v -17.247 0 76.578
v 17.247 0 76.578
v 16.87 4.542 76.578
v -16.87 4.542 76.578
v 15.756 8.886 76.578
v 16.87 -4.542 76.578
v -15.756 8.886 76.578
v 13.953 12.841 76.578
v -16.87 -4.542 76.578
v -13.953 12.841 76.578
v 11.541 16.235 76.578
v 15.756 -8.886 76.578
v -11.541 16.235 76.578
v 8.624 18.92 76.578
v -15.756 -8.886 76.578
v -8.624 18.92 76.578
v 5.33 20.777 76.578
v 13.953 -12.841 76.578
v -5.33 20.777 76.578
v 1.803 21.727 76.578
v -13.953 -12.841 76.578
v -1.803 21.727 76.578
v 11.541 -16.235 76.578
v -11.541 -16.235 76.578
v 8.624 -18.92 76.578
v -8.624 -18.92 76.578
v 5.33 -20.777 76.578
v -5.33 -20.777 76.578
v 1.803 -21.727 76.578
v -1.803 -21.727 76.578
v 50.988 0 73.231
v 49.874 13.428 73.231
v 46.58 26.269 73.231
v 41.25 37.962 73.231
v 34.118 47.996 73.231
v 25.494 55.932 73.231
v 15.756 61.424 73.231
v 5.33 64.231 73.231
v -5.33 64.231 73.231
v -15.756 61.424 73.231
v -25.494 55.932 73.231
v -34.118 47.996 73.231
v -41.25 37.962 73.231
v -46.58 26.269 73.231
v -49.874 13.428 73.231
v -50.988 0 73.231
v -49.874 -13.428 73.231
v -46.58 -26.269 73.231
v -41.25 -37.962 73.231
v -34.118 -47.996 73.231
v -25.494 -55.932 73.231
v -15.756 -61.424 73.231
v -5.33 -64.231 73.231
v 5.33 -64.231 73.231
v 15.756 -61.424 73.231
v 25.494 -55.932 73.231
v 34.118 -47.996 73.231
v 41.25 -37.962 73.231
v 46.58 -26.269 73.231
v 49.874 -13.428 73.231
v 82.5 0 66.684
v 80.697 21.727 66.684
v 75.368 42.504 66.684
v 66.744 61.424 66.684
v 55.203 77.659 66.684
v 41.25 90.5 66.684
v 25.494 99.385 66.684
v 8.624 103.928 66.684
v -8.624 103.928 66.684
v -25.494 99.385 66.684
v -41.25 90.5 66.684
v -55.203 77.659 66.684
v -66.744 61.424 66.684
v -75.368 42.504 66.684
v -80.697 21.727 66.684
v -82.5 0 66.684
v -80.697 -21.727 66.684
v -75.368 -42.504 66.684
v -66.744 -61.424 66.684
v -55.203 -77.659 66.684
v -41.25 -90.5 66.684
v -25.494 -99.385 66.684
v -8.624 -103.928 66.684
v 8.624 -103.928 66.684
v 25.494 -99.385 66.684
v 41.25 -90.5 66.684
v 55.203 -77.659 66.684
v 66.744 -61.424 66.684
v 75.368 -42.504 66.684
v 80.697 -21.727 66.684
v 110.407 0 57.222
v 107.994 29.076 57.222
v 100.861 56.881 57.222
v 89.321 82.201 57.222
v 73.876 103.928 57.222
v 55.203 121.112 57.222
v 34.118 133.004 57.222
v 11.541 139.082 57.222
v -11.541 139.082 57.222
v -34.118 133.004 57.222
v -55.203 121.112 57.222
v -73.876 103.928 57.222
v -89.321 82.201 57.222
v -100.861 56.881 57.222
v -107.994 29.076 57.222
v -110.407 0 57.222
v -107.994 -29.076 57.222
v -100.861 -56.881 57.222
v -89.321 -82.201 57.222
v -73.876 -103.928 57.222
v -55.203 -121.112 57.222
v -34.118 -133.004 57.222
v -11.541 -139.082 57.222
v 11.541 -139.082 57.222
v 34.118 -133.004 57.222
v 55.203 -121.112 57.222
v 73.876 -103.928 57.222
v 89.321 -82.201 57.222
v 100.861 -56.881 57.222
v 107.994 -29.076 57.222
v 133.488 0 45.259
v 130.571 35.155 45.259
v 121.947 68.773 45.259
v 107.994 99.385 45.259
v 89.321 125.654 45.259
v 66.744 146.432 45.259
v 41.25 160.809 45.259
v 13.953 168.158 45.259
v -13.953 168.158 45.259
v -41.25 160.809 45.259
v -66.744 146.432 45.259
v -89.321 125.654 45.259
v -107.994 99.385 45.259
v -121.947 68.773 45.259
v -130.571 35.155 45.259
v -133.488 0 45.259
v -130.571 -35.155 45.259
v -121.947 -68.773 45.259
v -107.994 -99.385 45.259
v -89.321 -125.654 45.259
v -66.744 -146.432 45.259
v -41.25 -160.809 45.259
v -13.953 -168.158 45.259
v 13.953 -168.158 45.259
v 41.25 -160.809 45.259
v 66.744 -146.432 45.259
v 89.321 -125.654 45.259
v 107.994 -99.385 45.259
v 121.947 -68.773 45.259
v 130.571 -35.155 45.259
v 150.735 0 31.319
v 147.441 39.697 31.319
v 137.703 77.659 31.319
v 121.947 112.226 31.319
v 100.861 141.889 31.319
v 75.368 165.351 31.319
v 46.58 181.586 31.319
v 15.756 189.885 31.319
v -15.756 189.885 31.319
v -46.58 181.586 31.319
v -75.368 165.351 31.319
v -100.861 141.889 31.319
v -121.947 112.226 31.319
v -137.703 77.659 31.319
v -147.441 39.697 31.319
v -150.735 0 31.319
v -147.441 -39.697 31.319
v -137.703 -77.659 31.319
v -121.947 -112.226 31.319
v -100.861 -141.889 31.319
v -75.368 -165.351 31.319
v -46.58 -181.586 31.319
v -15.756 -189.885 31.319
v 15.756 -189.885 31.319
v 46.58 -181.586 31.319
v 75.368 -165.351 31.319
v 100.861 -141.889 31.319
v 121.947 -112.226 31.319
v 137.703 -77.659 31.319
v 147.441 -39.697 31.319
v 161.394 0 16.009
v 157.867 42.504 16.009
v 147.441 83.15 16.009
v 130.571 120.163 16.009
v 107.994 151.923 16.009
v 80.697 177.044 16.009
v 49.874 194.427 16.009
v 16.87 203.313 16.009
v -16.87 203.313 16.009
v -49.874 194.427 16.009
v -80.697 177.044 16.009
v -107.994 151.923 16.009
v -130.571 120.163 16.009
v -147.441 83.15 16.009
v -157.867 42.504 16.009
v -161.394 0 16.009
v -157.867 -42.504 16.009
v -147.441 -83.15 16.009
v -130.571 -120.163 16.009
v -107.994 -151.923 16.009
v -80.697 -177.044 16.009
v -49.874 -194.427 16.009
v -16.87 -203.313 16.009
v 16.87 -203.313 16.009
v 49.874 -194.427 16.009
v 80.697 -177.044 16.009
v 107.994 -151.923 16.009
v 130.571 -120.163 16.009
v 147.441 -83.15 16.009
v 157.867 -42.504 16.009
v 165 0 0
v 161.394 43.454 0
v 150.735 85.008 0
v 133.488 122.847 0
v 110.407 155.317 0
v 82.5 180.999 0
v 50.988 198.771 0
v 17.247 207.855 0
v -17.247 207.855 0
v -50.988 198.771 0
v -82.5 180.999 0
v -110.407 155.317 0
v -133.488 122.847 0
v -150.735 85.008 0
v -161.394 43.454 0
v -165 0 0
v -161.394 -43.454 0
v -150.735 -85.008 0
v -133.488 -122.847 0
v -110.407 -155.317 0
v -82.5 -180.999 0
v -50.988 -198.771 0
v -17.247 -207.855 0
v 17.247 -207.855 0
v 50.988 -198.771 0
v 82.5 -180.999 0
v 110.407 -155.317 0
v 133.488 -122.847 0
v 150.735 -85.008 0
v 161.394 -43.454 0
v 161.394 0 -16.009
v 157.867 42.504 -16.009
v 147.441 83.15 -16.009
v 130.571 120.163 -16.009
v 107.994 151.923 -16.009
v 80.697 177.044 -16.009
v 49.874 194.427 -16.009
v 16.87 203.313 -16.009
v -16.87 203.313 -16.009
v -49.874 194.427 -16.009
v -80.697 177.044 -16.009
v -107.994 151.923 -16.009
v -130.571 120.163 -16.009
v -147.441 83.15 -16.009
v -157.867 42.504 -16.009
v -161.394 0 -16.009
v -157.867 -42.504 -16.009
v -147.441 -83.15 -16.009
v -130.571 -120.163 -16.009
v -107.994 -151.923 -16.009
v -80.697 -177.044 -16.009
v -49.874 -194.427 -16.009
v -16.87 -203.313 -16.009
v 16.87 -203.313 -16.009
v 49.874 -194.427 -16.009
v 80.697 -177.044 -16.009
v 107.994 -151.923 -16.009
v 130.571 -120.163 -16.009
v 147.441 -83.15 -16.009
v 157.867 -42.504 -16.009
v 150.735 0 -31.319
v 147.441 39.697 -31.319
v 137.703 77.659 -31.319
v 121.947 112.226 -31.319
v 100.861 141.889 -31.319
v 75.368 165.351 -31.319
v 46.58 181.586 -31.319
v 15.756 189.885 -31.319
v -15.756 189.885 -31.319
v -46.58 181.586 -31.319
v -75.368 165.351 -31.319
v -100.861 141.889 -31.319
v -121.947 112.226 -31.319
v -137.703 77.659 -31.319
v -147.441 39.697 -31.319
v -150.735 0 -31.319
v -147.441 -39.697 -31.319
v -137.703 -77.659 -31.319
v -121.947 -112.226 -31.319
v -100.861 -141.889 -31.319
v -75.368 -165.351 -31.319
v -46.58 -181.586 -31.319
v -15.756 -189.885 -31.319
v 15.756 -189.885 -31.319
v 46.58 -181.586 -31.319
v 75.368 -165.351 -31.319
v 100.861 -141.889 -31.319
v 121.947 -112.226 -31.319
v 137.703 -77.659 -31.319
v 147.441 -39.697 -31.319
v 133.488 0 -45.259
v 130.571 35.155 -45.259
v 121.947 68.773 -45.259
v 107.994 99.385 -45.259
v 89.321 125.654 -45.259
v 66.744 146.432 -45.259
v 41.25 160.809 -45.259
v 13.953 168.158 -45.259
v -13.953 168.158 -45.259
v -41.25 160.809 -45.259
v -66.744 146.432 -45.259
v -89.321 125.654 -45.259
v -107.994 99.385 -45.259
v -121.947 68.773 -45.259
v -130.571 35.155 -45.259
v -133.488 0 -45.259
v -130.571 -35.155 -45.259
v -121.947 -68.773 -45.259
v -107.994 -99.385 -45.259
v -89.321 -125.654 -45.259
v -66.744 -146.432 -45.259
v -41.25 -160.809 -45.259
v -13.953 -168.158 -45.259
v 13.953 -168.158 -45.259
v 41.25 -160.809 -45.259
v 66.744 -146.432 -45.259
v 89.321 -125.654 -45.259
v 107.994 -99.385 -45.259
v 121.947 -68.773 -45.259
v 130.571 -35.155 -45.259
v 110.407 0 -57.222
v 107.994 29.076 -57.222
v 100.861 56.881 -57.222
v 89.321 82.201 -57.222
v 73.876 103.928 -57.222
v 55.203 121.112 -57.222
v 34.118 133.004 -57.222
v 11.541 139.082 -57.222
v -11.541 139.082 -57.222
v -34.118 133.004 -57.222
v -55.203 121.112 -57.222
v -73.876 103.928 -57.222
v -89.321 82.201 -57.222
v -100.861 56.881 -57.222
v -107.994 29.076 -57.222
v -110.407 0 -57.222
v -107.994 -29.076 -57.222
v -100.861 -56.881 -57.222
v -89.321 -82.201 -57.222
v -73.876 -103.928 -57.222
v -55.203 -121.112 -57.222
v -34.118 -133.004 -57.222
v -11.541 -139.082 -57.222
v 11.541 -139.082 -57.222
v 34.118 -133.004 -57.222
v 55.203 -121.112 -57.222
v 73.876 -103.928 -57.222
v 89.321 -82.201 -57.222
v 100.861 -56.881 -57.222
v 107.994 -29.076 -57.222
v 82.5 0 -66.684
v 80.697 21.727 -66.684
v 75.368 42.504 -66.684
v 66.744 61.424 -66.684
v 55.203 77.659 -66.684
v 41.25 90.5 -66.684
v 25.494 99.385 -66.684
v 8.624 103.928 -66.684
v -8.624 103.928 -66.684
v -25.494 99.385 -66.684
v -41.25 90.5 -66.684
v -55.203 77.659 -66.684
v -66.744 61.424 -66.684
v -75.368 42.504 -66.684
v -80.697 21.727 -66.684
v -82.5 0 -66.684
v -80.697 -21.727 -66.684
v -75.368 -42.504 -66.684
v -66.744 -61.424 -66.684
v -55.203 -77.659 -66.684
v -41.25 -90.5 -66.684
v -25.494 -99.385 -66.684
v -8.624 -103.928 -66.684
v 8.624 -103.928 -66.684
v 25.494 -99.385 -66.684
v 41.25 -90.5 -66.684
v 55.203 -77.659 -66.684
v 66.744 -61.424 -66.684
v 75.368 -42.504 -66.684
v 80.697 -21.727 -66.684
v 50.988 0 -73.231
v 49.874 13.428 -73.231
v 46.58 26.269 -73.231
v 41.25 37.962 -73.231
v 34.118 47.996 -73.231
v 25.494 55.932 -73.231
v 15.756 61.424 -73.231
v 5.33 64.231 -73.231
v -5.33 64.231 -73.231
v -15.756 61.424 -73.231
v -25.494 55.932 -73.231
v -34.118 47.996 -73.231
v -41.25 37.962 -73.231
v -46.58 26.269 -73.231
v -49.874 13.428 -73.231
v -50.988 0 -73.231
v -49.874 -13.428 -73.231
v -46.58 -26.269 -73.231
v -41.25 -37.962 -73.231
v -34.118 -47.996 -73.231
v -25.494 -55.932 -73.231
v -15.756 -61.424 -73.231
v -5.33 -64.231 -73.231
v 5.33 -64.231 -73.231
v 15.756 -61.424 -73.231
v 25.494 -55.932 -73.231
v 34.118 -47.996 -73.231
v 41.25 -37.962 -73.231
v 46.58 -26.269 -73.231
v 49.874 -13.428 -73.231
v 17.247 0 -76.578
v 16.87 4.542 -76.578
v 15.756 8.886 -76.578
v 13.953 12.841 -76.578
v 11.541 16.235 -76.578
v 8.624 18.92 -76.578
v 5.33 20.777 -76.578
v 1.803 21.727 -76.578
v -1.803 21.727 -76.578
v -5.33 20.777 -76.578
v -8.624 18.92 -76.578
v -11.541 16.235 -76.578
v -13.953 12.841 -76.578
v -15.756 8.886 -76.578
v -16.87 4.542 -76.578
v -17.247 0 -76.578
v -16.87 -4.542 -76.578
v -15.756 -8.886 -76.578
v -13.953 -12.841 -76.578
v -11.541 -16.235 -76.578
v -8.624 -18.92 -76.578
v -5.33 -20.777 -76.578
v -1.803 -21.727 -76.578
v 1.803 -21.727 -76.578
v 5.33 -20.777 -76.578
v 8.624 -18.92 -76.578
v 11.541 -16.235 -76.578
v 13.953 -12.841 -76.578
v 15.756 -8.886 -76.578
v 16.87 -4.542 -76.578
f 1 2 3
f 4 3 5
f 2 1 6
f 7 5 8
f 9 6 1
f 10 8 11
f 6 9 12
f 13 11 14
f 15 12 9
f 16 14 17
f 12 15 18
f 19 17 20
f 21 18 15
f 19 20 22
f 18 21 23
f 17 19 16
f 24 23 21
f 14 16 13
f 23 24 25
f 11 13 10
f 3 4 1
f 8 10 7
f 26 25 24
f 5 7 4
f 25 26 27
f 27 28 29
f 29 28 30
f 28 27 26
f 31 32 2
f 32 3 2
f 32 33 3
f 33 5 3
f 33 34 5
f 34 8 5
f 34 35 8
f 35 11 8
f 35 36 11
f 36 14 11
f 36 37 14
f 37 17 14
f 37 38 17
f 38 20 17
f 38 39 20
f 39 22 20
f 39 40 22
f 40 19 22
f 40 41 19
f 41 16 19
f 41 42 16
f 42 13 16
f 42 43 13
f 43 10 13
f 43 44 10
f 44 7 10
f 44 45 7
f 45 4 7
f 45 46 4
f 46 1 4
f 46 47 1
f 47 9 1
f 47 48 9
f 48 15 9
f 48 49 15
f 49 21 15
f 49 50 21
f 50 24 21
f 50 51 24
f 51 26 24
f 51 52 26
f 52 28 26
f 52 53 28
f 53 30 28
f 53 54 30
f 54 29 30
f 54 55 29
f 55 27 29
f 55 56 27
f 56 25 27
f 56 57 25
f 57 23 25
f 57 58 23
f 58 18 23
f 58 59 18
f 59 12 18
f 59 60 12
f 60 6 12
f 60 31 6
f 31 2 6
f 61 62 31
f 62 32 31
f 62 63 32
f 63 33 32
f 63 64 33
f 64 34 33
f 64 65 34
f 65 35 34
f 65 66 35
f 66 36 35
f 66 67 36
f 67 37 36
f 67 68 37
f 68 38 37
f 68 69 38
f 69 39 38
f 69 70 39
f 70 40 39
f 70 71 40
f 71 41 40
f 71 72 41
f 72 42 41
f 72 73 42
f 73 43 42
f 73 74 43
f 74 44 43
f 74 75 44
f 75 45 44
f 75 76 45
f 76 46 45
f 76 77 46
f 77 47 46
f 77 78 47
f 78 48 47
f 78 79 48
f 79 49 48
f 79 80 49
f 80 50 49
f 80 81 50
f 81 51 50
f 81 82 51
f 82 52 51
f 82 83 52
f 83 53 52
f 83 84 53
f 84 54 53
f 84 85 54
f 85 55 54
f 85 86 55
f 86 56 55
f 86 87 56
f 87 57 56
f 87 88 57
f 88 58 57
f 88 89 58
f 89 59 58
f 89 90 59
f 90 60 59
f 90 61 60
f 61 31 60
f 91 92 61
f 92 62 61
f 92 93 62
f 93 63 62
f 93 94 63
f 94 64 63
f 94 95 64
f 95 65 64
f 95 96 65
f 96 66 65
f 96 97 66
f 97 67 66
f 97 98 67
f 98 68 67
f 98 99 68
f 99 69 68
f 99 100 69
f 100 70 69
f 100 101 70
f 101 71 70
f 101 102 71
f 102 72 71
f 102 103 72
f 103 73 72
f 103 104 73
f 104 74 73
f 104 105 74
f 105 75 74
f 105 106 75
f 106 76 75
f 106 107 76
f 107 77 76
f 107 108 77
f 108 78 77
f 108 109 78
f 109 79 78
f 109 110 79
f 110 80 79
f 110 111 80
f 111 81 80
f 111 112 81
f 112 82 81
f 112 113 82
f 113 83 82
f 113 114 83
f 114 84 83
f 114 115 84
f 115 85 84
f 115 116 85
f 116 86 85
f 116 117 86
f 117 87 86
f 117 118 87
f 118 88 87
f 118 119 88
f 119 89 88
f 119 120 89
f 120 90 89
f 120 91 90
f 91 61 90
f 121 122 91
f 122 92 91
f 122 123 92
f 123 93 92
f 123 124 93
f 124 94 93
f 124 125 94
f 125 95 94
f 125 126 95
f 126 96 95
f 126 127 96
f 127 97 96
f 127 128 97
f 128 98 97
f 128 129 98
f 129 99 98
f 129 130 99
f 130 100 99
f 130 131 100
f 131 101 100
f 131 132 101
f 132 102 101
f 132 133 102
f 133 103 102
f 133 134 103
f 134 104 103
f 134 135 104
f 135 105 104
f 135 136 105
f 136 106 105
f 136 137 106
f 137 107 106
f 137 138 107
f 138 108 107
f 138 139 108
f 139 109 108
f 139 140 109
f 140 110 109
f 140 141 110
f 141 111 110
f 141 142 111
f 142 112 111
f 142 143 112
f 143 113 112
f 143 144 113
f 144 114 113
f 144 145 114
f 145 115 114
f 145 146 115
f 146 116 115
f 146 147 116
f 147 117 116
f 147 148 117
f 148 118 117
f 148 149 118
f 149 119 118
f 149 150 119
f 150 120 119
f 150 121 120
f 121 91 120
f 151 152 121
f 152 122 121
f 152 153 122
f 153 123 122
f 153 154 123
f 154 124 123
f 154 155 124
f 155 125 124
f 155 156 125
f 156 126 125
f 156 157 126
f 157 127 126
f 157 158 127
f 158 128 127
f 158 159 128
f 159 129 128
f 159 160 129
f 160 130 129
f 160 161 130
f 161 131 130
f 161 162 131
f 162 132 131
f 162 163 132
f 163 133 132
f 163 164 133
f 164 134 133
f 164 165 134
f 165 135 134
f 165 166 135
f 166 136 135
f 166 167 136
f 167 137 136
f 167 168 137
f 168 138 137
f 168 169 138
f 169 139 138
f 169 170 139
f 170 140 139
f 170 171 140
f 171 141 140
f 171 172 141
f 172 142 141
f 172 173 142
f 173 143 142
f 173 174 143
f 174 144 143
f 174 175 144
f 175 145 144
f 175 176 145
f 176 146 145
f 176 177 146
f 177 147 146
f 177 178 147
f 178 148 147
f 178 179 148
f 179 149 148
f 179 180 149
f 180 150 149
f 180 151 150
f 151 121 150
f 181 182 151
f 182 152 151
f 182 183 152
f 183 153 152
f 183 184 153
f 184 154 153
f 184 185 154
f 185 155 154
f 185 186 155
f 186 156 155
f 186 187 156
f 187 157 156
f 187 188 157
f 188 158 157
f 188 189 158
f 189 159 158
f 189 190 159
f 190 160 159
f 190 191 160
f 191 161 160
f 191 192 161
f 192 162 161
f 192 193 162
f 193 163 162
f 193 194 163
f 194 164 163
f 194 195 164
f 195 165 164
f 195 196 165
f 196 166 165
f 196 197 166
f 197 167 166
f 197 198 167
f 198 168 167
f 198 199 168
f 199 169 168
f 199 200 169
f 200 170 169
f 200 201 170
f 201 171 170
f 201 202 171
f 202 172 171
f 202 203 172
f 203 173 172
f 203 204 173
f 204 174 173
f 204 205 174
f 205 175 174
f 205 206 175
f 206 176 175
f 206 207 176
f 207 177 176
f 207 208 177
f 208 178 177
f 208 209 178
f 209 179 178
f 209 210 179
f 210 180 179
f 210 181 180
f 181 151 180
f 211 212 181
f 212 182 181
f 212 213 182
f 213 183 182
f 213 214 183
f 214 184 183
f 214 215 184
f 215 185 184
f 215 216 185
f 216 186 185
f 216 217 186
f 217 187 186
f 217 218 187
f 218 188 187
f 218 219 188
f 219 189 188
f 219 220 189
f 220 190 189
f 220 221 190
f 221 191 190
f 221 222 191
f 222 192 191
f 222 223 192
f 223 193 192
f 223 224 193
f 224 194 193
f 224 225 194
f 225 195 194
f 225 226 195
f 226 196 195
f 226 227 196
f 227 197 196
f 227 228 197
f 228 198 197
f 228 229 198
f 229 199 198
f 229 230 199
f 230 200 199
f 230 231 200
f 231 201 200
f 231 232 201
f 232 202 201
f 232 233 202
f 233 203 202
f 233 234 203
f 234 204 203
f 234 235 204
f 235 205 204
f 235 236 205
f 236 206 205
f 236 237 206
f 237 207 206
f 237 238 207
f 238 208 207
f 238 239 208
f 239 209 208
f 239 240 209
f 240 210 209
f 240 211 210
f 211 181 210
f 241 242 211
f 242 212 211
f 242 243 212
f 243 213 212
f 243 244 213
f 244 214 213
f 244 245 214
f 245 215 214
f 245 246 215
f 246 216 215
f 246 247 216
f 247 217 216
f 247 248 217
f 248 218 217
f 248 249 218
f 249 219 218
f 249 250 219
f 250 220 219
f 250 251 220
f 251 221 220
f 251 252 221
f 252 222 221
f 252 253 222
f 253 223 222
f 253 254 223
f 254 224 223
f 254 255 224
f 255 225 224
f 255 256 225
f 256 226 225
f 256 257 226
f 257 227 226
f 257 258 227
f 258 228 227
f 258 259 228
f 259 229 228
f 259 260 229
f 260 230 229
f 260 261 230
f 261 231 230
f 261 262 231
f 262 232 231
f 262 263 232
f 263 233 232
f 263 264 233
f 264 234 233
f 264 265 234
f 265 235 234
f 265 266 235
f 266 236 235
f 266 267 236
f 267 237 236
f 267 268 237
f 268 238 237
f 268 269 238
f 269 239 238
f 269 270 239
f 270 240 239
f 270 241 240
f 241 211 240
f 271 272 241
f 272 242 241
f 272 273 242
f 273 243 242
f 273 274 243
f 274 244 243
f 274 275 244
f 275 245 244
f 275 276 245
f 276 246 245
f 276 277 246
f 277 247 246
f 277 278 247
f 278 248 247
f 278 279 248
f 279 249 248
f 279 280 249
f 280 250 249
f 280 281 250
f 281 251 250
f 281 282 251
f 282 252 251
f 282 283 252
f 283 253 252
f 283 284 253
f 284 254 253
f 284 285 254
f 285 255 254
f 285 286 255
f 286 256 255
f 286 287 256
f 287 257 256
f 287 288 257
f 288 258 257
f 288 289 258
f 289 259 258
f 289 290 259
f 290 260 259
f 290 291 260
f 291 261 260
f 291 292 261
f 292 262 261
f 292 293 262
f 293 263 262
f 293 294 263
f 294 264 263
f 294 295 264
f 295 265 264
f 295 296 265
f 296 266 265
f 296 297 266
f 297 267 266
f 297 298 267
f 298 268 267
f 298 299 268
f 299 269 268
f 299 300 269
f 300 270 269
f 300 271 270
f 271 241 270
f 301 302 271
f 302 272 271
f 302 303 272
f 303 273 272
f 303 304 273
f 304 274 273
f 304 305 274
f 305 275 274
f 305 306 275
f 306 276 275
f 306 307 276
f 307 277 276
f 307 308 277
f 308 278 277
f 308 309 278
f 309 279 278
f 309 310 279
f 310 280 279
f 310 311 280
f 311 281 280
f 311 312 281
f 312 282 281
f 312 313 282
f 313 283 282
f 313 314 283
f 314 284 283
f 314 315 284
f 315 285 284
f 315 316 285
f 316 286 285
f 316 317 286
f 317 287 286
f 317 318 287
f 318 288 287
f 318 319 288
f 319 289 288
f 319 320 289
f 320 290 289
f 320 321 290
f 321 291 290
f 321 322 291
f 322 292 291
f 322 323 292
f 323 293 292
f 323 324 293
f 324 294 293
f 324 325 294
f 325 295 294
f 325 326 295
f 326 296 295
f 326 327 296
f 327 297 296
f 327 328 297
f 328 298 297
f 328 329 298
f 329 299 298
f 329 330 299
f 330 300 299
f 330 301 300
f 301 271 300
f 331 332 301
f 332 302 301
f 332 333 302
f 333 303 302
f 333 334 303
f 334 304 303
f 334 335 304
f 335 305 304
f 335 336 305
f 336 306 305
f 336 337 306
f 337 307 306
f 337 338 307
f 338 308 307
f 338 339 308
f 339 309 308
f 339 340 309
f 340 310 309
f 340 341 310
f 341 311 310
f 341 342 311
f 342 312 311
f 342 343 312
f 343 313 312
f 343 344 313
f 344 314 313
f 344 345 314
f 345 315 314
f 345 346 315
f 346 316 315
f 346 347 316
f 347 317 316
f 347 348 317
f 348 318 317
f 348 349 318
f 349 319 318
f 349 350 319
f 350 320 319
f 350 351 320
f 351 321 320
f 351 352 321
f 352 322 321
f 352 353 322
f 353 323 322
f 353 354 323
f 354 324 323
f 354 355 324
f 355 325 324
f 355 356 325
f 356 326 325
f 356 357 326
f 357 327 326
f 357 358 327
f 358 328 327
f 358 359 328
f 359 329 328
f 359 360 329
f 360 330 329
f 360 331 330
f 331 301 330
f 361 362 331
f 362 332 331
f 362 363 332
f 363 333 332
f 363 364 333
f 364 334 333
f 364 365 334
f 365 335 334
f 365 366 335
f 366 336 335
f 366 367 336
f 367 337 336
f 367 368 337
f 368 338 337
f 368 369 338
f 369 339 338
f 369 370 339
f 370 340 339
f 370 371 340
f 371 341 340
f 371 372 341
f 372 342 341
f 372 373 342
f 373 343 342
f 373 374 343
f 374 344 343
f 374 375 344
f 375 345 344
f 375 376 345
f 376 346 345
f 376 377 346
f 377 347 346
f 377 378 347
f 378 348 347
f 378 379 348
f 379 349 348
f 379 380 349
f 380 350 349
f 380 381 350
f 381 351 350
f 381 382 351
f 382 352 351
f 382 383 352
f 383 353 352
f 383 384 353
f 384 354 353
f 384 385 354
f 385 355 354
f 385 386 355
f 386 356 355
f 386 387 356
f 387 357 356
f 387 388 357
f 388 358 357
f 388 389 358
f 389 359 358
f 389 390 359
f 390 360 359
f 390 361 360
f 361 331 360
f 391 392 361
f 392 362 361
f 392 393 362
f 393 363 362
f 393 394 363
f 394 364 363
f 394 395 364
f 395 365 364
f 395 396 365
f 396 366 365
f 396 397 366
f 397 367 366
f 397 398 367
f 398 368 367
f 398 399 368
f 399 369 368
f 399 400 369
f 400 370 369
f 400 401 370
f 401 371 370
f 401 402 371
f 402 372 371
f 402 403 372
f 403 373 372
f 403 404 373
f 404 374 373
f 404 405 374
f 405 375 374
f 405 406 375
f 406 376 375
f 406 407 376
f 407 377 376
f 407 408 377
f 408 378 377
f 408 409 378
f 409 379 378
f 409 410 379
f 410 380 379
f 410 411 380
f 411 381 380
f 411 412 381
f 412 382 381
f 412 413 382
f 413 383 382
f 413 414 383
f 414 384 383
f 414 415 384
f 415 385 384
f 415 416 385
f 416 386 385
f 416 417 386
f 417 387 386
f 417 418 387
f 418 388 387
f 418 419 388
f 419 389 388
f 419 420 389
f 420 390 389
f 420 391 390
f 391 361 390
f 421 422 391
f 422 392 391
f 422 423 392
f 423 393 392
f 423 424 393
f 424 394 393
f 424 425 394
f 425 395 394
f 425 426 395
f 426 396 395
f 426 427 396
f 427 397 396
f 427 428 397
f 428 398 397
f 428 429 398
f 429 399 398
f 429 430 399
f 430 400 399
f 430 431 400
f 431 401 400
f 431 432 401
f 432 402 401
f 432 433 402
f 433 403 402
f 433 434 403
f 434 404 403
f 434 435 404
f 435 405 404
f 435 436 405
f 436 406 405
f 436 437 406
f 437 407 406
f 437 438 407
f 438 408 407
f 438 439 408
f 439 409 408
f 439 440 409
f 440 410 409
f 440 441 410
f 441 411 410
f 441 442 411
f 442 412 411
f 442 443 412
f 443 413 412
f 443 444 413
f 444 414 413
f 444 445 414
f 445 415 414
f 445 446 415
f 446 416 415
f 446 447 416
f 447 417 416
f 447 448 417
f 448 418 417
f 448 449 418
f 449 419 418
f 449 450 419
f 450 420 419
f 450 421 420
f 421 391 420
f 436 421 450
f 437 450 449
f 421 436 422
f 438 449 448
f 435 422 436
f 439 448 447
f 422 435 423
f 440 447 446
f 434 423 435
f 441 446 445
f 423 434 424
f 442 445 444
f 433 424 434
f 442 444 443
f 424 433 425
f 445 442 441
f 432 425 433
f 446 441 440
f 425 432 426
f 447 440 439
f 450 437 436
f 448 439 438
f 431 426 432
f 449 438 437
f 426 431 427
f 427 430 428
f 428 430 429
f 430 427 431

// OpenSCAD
// Generated by SolidPython 1.0.1 on 2020-07-29 00:46:52


scale(v = [15, 19, 7]) {
	sphere(r = 11);
}
/***********************************************
*********      SolidPython code:      **********
************************************************
 
# import packages: SolidPython
from solid import *
from solid.utils import *
from itertools import chain, combinations, permutations


class Resize:

    def __init__(self, scad_file):
        self.scad_file = scad_file
        #self.scad_file = import_scad(scad_file)
        # cone/cylinder param:
        self.r1 = 0
        self.r2 = 0
        self.h = 0
        # rectangular prism param:
        self.w = 0
        self.l = 0
        # ellipse param:
        self.r = 0

    # import OpenScad code (file name corresponds to shape)


    # classify shape + parameters
    def assign(self, param1, param2, param3):
        if self.scad_file == 'cone.scad':
            self.r1 = param1
            self.r2 = param2
            self.h = param3
        elif self.scad_file == 'cylinder.scad':
            self.r1 = param1
            self.r2 = param2
            self.h = param3
        elif self.scad_file == 'rectangularPrism.scad':
            self.h = param1
            self.l = param2
            self.w = param3
        else:
            self.r = param1
            self.h = param2

    # resize parameters
    def iterate(self):
        x = range(3, 20, 2)
        i = 1
        if self.scad_file == 'cone.scad':
            tempList = list(permutations(x, 2))
            for temp in tempList:
                param1 = temp[0]
                param2 = temp[1]
                filepath = 'produced_scad_files/' + 'cone' + str(param1) + '_' + str(param2) + '_' + '.scad'
                scad_render_to_file(cylinder(h=param1, r1=param2, r2=0), filepath)

        elif self.scad_file == 'cylinder.scad':
            tempList = list(permutations(x, 3))
            for temp in tempList:
                param1 = temp[0]
                param2 = temp[1]
                filepath = 'produced_scad_files/' + 'cylinder' + str(param1) + '_' + str(param2) + '_' + '.scad'
                scad_render_to_file(cylinder(h=param1, r1=param2, r2=param2), filepath)

        elif self.scad_file == 'rectangularPrism.scad':
            tempList = list(permutations(x, 3))
            for temp in tempList:
                param1 = temp[0]
                param2 = temp[1]
                param3 = temp[2]
                filepath = 'produced_scad_files/' + 'rectangularPrism' + str(param1) + '_' + str(param2) + '_' + str(
                    param3) + '.scad'
                scad_render_to_file(cube(size=(param1, param2, param3)), filepath)

        elif self.scad_file == 'ellipse.scad':
            tempList = list(permutations(x, 4))
            for temp in tempList:
                param1 = temp[0]
                param2 = temp[1]
                param3 = temp[2]
                param4 = temp[3]
                filepath = 'produced_scad_files/' + 'ellipse' + str(param1) + '_' + str(param2) + '_' + str(param3) + '_' + str(param4) + '.scad'
                scad_render_to_file(scale([param1, param2, param3])(sphere(r=param4)), filepath)

    def render_to_scadfile(self):
        scad_render_to_file(scad, 'example.scad') 
 
************************************************/
